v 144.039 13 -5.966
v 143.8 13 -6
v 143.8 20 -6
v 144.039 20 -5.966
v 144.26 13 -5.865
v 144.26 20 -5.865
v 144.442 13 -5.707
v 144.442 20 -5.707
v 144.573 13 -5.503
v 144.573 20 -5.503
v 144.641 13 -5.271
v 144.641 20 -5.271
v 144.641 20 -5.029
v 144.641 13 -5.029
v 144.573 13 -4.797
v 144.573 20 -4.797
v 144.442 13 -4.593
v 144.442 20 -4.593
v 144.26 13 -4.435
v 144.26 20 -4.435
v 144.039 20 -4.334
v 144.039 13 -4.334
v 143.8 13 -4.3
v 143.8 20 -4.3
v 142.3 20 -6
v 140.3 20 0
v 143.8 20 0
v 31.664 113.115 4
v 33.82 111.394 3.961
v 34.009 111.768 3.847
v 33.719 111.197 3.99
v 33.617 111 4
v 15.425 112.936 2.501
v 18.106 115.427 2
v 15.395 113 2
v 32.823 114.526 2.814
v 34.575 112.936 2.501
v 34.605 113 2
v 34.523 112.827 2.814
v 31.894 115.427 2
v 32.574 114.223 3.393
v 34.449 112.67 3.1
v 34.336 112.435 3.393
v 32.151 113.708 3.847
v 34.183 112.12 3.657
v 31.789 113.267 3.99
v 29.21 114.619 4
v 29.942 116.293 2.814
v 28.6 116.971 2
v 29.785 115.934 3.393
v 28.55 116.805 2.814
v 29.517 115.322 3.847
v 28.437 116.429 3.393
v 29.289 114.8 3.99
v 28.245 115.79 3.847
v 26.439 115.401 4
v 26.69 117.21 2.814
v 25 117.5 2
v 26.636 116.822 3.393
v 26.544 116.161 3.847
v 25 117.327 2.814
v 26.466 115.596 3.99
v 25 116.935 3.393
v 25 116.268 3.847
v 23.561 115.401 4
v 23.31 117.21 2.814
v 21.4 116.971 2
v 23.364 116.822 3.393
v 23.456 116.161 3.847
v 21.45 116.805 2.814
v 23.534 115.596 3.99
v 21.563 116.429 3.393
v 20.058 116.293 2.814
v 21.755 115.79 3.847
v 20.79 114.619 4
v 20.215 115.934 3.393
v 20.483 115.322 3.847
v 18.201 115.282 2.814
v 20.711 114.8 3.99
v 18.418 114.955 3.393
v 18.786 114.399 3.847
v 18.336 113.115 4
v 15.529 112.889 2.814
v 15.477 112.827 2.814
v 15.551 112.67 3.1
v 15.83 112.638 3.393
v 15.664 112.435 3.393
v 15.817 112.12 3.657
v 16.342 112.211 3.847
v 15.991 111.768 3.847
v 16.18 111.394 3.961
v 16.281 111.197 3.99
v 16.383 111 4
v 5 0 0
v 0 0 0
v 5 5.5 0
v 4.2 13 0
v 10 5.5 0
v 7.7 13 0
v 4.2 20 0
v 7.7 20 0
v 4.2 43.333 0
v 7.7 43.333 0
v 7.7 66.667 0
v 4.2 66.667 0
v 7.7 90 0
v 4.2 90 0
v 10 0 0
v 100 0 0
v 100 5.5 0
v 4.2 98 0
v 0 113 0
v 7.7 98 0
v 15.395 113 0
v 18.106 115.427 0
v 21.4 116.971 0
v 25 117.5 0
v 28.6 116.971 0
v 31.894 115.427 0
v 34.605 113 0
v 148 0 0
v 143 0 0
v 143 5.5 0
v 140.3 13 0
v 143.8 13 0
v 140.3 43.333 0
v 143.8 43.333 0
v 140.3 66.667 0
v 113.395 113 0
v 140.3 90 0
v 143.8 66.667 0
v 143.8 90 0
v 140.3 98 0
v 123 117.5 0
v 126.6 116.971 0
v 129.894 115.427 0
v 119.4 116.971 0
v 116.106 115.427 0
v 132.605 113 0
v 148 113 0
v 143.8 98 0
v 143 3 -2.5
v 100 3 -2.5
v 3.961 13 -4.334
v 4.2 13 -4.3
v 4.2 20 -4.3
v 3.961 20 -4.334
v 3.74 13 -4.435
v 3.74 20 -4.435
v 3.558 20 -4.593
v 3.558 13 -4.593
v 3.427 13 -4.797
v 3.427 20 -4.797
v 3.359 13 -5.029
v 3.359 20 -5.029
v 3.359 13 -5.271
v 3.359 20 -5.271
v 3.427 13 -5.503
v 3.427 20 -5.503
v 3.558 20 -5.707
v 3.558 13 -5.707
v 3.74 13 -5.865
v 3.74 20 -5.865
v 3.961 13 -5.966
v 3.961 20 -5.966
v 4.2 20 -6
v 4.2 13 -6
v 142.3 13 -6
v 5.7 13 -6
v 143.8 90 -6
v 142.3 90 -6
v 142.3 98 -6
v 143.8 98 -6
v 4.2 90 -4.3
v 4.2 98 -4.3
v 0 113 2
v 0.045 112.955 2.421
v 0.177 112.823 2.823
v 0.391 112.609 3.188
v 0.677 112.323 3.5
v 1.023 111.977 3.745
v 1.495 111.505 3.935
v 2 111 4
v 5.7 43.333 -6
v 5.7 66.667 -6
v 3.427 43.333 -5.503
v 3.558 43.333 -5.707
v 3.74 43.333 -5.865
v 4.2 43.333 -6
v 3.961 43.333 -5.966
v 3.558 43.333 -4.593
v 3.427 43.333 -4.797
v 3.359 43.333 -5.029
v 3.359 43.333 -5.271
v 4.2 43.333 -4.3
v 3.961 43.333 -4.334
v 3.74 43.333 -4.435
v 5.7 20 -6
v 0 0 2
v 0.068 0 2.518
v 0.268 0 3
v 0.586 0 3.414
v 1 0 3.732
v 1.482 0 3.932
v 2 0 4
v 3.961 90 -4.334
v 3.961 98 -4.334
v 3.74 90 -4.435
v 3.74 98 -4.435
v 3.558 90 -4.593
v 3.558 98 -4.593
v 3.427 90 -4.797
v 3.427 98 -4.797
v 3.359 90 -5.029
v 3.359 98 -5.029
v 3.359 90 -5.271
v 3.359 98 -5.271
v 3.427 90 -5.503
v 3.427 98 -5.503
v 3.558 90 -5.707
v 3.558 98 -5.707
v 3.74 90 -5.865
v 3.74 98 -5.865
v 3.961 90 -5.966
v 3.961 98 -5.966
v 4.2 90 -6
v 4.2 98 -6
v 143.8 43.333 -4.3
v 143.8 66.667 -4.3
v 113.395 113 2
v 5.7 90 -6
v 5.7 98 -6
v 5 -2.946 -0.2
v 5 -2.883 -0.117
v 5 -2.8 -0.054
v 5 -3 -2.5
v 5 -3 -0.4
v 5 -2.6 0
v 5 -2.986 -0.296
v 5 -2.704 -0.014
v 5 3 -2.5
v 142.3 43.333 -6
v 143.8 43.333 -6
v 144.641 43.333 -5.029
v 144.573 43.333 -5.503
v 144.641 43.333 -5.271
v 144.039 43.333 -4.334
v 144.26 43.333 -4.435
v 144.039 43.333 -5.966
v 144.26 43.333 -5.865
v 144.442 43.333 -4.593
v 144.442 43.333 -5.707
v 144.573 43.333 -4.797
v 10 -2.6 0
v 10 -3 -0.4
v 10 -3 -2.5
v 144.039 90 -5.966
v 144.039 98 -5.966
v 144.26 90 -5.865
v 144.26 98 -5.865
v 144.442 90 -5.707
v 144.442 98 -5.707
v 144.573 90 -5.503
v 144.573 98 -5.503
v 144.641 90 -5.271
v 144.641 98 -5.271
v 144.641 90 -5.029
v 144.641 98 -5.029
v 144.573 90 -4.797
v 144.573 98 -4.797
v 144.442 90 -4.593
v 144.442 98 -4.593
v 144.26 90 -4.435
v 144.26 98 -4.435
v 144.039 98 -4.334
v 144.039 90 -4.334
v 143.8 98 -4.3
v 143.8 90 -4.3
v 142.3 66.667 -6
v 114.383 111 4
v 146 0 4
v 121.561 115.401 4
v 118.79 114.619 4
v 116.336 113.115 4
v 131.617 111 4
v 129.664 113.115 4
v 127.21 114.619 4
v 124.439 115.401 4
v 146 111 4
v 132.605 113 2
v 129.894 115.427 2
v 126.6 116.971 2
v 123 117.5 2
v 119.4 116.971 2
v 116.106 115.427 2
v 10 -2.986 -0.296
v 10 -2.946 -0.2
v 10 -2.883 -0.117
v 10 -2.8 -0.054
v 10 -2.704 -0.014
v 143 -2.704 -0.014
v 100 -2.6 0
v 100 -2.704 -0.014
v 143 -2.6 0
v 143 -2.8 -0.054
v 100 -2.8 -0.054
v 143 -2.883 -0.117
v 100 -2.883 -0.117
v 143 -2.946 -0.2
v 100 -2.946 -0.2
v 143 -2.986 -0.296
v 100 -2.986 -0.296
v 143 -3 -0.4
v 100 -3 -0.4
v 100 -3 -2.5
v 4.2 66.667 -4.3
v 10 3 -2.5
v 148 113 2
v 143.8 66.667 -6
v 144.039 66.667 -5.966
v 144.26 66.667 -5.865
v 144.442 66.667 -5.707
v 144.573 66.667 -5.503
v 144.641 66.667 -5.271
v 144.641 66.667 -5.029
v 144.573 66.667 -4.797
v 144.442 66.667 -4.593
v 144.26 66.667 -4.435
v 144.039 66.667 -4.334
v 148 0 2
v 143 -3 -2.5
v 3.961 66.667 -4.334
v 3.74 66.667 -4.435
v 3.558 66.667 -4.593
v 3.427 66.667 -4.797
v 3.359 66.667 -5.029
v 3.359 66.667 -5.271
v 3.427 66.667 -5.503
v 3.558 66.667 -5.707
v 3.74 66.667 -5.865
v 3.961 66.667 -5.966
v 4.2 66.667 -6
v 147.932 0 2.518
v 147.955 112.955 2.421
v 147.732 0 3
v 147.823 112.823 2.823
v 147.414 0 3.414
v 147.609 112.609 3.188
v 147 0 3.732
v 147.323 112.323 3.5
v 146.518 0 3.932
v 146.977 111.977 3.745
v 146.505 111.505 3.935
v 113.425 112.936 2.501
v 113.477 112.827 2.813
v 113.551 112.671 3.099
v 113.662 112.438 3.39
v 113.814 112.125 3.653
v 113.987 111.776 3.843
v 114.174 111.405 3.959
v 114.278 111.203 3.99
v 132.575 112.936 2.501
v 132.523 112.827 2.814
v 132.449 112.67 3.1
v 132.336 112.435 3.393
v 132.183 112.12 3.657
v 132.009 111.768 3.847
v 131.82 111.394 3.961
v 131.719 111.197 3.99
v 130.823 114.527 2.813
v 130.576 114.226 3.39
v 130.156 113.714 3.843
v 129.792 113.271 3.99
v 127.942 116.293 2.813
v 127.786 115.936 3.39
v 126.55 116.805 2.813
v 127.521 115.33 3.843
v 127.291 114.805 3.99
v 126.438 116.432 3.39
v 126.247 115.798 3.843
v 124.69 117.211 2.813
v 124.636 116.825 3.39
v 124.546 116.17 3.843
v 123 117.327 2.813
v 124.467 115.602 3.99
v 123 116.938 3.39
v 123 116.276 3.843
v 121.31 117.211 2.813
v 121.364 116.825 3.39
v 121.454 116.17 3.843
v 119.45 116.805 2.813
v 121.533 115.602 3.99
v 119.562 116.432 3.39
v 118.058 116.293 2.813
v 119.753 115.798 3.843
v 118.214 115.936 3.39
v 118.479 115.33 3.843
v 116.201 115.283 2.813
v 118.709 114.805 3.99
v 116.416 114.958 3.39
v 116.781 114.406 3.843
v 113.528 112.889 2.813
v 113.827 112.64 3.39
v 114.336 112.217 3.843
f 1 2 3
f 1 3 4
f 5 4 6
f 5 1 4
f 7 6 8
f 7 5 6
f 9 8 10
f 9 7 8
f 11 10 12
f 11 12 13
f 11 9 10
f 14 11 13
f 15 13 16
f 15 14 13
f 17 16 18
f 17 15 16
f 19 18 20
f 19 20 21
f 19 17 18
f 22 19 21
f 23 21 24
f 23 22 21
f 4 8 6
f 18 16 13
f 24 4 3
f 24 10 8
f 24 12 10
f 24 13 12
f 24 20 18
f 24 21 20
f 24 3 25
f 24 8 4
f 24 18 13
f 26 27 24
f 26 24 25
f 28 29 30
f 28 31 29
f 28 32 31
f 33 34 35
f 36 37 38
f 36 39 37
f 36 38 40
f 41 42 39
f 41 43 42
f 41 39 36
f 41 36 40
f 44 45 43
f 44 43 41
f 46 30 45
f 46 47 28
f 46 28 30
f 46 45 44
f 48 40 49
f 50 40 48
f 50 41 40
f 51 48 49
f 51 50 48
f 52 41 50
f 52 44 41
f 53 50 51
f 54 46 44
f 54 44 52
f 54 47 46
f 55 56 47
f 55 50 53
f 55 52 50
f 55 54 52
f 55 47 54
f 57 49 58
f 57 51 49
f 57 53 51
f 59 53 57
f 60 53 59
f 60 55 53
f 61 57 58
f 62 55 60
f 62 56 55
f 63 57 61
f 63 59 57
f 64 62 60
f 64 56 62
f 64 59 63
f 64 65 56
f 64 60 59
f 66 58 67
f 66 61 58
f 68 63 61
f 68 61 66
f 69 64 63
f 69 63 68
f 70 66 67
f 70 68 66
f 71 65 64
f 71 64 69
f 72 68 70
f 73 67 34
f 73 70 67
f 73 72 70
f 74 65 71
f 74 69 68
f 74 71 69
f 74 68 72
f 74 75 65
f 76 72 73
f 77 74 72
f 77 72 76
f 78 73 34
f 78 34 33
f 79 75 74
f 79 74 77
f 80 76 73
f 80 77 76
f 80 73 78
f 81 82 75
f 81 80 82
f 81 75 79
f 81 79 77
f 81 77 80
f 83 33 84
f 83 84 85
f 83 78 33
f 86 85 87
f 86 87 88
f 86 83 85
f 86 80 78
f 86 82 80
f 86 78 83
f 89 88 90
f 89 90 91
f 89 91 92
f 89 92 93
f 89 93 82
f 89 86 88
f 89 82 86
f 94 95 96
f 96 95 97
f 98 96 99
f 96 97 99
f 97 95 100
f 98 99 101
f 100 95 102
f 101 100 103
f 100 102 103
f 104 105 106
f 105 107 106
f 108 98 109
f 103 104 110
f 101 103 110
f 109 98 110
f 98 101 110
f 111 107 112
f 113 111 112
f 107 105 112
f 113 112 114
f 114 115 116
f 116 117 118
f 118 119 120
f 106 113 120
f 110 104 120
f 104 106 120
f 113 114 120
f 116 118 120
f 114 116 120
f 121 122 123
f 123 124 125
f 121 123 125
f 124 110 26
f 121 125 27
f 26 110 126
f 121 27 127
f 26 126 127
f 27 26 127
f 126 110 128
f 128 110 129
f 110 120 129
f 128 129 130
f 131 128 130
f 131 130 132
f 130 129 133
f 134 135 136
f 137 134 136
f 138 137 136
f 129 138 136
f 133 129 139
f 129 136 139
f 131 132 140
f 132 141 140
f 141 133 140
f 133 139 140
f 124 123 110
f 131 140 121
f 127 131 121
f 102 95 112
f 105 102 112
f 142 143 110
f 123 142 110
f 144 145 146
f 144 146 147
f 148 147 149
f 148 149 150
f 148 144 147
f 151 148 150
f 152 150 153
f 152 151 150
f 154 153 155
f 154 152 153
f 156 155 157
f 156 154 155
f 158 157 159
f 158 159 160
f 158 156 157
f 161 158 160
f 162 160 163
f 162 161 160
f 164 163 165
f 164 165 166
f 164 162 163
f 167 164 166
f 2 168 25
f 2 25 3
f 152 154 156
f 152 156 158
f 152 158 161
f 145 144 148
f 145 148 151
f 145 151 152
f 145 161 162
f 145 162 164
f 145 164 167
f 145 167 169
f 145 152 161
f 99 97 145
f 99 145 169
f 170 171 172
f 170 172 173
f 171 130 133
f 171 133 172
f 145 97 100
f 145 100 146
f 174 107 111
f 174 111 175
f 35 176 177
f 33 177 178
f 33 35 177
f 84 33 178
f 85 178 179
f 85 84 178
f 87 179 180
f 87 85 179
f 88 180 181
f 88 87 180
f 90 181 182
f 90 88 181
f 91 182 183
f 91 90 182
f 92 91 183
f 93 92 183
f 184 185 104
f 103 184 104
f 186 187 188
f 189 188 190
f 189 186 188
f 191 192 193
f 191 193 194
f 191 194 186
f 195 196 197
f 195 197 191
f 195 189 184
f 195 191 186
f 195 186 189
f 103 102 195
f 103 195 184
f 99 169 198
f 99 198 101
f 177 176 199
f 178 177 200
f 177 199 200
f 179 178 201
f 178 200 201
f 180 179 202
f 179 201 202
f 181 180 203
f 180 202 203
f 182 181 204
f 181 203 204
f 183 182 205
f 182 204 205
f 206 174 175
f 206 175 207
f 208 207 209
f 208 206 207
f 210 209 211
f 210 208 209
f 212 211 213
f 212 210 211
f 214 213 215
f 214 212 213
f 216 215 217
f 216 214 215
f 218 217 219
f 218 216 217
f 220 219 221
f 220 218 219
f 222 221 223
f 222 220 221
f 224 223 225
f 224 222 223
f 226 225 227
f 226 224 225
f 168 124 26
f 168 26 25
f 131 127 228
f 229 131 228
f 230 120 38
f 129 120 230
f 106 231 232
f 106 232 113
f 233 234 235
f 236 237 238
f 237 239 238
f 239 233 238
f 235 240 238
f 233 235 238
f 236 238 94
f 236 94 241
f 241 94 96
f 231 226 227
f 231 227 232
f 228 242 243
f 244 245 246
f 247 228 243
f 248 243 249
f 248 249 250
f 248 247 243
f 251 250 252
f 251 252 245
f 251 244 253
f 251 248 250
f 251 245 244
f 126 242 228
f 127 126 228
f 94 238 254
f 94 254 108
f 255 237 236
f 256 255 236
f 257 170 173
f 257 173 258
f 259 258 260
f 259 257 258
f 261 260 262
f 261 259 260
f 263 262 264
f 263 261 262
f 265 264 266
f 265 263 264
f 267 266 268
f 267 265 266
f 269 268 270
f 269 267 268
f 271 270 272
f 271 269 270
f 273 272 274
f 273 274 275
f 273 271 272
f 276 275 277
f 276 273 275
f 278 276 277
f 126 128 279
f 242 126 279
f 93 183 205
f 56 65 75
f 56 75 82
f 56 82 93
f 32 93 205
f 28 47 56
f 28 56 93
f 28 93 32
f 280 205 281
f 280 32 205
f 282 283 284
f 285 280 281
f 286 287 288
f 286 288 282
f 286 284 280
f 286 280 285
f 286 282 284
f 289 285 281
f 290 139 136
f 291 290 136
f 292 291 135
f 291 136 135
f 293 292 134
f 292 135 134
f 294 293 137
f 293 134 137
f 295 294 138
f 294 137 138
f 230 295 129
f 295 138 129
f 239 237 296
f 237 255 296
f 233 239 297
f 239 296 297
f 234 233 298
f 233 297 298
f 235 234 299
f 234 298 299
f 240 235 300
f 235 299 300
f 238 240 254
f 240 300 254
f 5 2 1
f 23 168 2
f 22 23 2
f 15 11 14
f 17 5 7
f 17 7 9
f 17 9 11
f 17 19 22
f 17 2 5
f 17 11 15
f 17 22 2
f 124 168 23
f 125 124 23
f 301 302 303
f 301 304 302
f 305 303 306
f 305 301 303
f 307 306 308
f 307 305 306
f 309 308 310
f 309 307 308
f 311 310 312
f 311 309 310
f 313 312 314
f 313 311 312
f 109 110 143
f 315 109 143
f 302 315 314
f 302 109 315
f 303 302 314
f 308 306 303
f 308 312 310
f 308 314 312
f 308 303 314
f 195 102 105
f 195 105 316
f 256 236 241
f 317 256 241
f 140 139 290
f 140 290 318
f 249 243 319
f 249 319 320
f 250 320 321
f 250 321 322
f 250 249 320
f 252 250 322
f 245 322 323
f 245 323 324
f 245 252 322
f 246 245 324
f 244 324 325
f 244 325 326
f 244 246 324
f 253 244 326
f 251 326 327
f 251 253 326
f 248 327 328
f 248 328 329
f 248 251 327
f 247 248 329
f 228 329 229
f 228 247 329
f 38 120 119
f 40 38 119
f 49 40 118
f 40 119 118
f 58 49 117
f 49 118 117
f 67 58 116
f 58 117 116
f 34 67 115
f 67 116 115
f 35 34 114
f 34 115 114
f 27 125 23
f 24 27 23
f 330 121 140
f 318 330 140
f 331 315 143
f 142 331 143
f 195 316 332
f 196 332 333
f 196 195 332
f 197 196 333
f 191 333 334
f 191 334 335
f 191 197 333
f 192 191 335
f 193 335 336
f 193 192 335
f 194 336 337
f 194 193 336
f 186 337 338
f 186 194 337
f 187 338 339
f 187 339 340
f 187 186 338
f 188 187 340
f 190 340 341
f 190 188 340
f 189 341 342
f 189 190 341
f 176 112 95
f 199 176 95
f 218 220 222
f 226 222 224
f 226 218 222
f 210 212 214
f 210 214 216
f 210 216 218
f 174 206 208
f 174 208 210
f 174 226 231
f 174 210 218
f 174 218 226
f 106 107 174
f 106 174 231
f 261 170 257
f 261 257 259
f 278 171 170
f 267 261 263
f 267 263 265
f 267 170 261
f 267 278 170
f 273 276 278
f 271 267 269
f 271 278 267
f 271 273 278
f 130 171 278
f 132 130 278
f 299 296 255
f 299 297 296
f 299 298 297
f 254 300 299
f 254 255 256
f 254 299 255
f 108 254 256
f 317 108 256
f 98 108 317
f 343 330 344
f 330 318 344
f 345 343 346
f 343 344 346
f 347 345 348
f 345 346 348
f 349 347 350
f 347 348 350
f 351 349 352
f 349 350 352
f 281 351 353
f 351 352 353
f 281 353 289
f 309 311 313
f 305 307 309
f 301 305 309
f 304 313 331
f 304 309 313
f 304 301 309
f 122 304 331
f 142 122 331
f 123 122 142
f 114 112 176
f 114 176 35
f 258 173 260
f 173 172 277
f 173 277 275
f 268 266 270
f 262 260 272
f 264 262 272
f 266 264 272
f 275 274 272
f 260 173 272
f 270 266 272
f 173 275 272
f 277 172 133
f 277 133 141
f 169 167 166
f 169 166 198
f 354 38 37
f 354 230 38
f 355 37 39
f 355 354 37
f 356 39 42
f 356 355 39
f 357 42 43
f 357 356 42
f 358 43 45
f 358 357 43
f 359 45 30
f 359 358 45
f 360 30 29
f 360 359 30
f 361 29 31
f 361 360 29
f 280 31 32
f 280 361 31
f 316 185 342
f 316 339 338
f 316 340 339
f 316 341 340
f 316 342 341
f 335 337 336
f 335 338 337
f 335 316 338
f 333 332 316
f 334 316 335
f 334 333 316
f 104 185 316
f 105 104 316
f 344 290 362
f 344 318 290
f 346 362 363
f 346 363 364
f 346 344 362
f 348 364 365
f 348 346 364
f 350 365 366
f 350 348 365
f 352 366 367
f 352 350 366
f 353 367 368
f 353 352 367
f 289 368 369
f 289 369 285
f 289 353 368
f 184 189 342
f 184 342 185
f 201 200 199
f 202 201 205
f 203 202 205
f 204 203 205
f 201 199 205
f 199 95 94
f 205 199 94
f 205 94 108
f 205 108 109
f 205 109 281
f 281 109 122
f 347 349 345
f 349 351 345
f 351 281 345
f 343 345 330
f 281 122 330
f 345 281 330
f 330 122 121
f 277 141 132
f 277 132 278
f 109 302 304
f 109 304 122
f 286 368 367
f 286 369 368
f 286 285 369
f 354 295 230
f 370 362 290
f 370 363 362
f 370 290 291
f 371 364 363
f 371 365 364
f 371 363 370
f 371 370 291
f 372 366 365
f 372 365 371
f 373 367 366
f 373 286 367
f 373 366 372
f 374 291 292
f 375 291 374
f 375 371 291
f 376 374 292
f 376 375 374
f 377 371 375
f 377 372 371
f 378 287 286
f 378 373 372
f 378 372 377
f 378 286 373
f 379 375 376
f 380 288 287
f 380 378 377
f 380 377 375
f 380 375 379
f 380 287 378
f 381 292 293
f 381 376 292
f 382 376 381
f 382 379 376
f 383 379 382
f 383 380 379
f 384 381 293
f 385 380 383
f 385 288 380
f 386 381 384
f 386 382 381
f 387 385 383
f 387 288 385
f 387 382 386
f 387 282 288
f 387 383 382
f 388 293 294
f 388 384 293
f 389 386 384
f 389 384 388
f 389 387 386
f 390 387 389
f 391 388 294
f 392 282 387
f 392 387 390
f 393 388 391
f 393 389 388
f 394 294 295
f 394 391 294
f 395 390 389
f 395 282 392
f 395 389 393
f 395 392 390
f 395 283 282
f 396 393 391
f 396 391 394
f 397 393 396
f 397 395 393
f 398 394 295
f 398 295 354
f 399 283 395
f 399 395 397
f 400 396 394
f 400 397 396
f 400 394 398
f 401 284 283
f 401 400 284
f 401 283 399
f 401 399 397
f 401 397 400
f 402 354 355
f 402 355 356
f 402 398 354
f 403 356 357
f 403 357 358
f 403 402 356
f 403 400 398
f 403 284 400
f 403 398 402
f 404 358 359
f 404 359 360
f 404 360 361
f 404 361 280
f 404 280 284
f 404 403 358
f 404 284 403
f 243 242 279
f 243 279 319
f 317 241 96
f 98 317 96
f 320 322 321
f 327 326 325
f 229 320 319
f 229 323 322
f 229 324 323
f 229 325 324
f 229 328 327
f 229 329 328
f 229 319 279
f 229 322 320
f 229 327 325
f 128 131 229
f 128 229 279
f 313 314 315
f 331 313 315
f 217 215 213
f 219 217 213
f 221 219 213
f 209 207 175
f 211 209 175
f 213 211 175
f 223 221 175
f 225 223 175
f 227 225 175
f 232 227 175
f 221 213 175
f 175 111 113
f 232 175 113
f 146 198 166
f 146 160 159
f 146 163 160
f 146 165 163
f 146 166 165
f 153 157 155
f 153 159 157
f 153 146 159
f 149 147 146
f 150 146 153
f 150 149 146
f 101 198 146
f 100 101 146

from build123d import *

# Parameters (mm, degrees)
PAD_DEPTH    = 4
PAD001_DEPTH = 138
PAD002_DEPTH = 85
POCKET_DEPTH = 10
FILLET_R     = 0.4
FILLET001_R  = 2


with BuildPart() as part:
    # Sketch → Pad (new body)
    with BuildSketch(Plane.XY):
        with BuildLine():
            Line((0, 0), (148, 0))
            Line((148, 0), (148, 113))
            Line((132.604686, 113), (148, 113))
            ThreePointArc((132.604686, 113), (123, 117.5), (113.395314, 113))
            Line((34.604686, 113), (113.395314, 113))
            ThreePointArc((34.604686, 113), (25, 117.5), (15.395314, 113))
            Line((0, 113), (15.395314, 113))
            Line((0, 113), (0, 0))
        make_face()
    extrude(amount=PAD_DEPTH)

    # Sketch001 (on Face3 of Pad) → Pad001 (join)
    with BuildSketch(Plane(origin=(5, 0, 0), x_dir=(0, -1, 0), z_dir=(-1, 0, 0))):
        Polygon((3, 0), (3, -2.5), (-3, -2.5), (-5.5, 0), (0, 0), align=None)
    extrude(amount=-PAD001_DEPTH)

    # Sketch002 (on Face10 of Pad001) → Pad002 (join)
    with BuildSketch(Plane.XZ.offset(-13)):
        with BuildLine():
            Line((143.8, 0), (140.3, 0))
            Line((140.3, 0), (142.3, -6))
            Line((142.3, -6), (143.8, -6))
            ThreePointArc((143.8, -6), (144.65, -5.15), (143.8, -4.3))
            Line((143.8, 0), (143.8, -4.3))
        make_face()
        with BuildLine():
            Line((4.2, 0), (4.2, -4.3))
            ThreePointArc((4.2, -4.3), (3.35, -5.15), (4.2, -6))
            Line((4.2, -6), (5.7, -6))
            Line((5.7, -6), (7.7, 0))
            Line((7.7, 0), (4.2, 0))
        make_face()
    extrude(amount=-PAD002_DEPTH)

    # Sketch003 (on Face4 of Pad002) → Pocket (cut)
    with BuildSketch(Plane(origin=(0, 0, 0), x_dir=(1, 0, 0), z_dir=(0, 0, -1))):
        Polygon((100, 10), (10, 10), (10, -20), (-10, -20), (-10, -43.333333), (10, -43.333333), (10, -66.666667), (-10, -66.666667), (-10, -90), (158, -90), (158, -66.666667), (100, -66.666667), (100, -43.333333), (158, -43.333333), (158, -20), (100, -20), align=None)
    extrude(amount=POCKET_DEPTH, mode=Mode.SUBTRACT)

    # Fillet
    fillet_edges = [part.edges().sort_by_distance(p)[0] for p in [
        (121.5, -3, 0),
        (7.5, -3, 0),
    ]]
    fillet(fillet_edges, radius=FILLET_R)

    # Fillet001
    fillet001_edges = [part.edges().sort_by_distance(p)[0] for p in [
        (0, 56.5, 4),
        (7.697657, 113, 4),
        (25, 117.5, 4),
        (74, 113, 4),
        (148, 56.5, 4),
        (140.302343, 113, 4),
        (123, 117.5, 4),
    ]]
    fillet(fillet001_edges, radius=FILLET001_R)


solid = part.part
